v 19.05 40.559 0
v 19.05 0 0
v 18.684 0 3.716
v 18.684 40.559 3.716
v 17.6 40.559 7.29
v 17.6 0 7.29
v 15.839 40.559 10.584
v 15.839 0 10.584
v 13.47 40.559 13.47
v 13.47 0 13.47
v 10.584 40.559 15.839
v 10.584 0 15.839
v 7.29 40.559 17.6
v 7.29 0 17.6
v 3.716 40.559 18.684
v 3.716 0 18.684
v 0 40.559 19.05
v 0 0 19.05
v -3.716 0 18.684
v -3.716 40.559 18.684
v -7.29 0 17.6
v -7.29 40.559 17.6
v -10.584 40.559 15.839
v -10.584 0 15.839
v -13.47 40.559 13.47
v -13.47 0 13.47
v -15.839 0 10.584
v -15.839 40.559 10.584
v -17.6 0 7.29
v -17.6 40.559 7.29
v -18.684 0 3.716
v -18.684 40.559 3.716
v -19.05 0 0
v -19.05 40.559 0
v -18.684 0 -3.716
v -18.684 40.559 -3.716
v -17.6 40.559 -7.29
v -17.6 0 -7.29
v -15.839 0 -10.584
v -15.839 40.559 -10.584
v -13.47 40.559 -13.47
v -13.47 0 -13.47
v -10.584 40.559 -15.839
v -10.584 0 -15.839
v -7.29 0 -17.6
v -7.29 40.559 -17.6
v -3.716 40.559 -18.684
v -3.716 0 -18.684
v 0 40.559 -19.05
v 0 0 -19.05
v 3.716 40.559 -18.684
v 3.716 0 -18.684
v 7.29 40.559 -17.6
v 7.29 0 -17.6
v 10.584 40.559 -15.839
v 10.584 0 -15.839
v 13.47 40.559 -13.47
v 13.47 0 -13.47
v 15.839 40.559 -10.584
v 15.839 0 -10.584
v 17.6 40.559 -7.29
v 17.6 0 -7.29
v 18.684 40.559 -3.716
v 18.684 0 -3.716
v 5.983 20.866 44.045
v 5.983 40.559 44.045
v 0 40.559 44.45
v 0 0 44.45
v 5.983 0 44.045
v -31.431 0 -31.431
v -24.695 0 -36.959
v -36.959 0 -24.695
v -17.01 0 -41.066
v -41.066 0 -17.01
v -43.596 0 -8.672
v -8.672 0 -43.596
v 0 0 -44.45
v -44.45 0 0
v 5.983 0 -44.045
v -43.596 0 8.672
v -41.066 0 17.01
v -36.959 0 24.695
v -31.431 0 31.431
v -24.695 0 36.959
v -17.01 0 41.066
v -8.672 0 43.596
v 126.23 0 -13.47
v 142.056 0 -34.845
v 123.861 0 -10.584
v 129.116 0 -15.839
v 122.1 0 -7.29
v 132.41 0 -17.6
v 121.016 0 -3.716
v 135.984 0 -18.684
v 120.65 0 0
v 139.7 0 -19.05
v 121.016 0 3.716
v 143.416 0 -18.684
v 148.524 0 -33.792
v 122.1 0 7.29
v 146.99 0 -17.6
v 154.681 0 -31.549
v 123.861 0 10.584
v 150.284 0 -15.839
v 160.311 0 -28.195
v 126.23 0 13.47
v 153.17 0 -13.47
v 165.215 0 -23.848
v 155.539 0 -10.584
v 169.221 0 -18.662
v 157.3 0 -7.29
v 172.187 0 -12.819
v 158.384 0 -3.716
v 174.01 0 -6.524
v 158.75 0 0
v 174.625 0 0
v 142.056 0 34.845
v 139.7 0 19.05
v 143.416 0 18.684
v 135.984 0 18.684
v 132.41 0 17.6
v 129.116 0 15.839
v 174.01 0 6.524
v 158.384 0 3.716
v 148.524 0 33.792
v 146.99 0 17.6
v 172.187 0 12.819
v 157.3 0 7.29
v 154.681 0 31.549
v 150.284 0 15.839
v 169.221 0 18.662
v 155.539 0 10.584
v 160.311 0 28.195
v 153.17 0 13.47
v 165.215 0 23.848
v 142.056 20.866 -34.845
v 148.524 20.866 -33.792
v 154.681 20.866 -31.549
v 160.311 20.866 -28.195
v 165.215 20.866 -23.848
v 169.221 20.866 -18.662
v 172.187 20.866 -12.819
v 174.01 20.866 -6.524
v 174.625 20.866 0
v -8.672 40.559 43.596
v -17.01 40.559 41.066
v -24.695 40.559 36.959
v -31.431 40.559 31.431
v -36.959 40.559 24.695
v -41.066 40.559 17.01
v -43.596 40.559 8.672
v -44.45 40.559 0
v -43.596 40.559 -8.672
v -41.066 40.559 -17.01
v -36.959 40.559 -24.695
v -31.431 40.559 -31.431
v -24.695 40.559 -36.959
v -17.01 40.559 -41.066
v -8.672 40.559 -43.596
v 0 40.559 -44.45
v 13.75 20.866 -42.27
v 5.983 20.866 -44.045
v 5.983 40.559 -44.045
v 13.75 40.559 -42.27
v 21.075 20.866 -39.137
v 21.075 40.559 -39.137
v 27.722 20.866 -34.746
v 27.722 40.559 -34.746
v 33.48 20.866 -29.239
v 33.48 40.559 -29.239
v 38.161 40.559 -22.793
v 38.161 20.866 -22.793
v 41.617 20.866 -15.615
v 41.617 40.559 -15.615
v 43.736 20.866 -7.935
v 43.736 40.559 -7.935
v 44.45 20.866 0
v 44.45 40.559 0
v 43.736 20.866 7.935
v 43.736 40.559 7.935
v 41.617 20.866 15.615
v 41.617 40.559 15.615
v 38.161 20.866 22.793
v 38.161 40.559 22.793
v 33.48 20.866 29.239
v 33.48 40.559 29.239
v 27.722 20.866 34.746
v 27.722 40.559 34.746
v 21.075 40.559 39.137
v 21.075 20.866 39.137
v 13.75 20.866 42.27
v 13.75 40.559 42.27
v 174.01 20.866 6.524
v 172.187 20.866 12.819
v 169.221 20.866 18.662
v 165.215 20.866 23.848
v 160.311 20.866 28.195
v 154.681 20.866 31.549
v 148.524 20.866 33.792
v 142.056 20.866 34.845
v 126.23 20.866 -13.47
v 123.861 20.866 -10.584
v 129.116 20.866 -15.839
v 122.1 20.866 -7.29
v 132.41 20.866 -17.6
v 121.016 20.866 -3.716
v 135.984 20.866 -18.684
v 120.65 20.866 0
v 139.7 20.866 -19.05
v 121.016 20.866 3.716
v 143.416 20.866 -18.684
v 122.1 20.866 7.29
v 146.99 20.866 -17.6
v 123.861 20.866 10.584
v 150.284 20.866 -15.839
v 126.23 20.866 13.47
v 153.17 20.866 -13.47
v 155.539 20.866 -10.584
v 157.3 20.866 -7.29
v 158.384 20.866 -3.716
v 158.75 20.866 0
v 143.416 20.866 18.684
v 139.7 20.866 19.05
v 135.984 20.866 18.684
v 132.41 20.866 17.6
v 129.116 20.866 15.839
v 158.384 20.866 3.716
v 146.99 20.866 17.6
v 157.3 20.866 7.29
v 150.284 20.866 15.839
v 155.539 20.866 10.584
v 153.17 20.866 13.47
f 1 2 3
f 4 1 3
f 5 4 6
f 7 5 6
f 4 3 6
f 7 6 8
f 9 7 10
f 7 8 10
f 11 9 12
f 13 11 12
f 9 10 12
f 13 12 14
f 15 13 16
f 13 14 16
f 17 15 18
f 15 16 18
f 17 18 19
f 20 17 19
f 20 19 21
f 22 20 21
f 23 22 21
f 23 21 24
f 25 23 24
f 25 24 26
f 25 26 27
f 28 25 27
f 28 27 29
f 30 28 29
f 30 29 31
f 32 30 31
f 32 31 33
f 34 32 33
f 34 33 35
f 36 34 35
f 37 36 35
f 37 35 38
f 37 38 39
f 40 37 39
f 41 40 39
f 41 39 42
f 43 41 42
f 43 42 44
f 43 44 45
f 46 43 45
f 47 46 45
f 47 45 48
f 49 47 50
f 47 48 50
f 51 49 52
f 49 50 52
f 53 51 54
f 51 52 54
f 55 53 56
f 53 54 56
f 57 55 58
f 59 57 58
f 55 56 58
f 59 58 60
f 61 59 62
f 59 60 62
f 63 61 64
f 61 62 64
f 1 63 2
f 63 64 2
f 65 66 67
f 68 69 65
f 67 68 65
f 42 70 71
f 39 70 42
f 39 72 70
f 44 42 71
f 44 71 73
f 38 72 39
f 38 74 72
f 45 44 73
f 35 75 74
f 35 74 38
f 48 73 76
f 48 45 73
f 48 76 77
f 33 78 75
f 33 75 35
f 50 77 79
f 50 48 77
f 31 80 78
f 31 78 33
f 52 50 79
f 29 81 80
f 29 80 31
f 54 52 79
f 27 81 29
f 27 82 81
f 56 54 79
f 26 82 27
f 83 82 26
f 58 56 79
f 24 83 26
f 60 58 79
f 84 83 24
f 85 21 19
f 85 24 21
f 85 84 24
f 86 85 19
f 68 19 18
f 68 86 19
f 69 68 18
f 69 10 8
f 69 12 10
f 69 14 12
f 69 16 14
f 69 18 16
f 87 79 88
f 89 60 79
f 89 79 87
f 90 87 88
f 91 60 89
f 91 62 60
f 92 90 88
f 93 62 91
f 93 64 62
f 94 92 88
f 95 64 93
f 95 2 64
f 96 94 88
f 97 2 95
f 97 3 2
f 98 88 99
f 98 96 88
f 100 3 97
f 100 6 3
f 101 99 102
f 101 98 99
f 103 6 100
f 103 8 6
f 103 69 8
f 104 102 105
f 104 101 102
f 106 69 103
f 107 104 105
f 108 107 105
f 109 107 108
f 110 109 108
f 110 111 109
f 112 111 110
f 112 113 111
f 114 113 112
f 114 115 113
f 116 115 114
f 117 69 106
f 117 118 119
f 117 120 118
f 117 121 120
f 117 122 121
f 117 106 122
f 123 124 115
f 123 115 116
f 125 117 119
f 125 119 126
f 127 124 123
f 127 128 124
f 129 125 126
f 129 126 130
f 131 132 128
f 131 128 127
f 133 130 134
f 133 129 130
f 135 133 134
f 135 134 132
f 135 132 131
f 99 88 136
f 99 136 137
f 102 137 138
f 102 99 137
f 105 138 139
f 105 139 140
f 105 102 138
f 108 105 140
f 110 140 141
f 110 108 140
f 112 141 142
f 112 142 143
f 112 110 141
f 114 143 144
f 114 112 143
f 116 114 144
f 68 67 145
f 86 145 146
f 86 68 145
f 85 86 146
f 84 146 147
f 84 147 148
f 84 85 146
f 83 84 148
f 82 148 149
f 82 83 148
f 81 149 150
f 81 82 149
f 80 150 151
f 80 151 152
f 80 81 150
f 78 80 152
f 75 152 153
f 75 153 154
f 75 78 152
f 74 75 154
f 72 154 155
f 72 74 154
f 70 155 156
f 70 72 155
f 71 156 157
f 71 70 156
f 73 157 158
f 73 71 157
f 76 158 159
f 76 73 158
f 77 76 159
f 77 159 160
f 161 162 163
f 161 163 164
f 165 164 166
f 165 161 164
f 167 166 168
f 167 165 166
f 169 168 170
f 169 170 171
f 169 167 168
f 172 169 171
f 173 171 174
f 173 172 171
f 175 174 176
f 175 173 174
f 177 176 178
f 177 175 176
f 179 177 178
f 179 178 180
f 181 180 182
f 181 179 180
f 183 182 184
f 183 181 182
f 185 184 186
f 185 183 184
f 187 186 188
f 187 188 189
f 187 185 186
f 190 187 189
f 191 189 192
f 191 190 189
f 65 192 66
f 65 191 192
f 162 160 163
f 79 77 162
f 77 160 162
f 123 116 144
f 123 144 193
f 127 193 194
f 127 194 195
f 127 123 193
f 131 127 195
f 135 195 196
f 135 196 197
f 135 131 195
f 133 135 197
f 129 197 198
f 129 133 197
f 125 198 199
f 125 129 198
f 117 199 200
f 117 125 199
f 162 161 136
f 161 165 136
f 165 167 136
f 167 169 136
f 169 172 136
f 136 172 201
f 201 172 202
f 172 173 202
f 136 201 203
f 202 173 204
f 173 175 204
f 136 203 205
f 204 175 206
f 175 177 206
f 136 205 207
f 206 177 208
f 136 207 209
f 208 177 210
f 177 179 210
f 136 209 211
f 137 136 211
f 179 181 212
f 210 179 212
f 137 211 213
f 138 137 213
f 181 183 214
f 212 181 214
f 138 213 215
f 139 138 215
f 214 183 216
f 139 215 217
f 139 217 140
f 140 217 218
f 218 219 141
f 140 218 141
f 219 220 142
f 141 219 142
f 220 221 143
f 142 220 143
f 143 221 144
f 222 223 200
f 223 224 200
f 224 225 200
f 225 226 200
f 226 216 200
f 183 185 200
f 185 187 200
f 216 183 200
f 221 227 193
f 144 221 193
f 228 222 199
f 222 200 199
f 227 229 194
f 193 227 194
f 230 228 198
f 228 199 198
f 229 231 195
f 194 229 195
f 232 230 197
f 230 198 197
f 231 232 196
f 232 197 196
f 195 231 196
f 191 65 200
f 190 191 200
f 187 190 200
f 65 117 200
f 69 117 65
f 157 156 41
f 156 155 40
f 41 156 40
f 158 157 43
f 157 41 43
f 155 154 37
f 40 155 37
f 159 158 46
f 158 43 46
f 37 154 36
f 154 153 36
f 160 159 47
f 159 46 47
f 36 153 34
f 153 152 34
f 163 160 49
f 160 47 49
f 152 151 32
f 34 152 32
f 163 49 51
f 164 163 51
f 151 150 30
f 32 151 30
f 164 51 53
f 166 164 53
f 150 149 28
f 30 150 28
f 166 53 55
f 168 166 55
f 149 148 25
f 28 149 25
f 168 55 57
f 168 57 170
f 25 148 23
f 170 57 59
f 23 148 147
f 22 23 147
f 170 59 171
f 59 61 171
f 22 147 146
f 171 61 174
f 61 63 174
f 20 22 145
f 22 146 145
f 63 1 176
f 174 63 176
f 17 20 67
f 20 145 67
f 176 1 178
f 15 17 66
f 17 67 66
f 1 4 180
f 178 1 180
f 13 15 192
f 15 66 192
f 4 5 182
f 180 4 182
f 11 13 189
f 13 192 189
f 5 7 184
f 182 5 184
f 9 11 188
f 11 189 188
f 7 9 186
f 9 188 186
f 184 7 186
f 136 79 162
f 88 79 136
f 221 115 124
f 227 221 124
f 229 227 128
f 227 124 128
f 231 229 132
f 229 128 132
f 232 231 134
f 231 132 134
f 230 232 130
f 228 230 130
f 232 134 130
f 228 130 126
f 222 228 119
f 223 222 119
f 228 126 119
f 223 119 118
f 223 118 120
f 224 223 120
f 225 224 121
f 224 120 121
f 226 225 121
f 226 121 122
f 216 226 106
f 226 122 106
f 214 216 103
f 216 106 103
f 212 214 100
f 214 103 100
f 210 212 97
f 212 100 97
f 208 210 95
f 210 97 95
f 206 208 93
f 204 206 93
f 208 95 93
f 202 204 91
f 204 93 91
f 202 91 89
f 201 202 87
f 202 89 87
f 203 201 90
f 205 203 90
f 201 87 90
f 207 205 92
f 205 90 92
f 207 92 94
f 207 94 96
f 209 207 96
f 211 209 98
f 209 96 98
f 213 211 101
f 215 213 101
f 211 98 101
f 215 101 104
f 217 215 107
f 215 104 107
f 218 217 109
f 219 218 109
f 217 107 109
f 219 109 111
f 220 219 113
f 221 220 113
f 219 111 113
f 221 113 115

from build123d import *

# Parameters (mm, degrees)
F0_R     = 19.05
F1_DEPTH = 20.8662841469
F2_DEPTH = 40.5588373542


# Not quite as in the source:
# - the program builds the solid bodies; features that only make, move or delete a surface that nothing else refers to are left out


with BuildPart() as f1:
    # F0 (on Front) → F1 (new body)
    with BuildSketch(Plane.XZ):
        with BuildLine():
            Line((5.983272408, 44.0454645939), (0, 44.45))
            ThreePointArc((0, 44.45), (-44.45, 0), (0, -44.45))
            Line((0, -44.45), (5.983272408, -44.0454645939))
            ThreePointArc((5.983272408, -44.0454645939), (33.4795382177, -29.2390666871), (44.45, 0))
            ThreePointArc((44.45, 0), (33.4795382177, 29.2390666871), (5.983272408, 44.0454645939))
        make_face()
        Circle(F0_R, mode=Mode.SUBTRACT)
        with BuildLine():
            Line((142.0559377087, 34.8454470844), (5.983272408, 44.0454645939))
            ThreePointArc((5.983272408, 44.0454645939), (33.4795382177, 29.2390666871), (44.45, 0))
            ThreePointArc((44.45, 0), (33.4795382177, -29.2390666871), (5.983272408, -44.0454645939))
            Line((5.983272408, -44.0454645939), (142.0559377087, -34.8454470844))
            ThreePointArc((142.0559377087, -34.8454470844), (104.775, 0), (142.0559377087, 34.8454470844))
        make_face()
        with BuildLine():
            ThreePointArc((174.625, 0), (165.2150617232, 23.8482127268), (142.0559377087, 34.8454470844))
            ThreePointArc((142.0559377087, 34.8454470844), (104.775, 0), (142.0559377087, -34.8454470844))
            ThreePointArc((142.0559377087, -34.8454470844), (165.2150617232, -23.8482127268), (174.625, 0))
        make_face()
        with Locations((139.7, 0)):
            Circle(F0_R, mode=Mode.SUBTRACT)
    extrude(amount=-F1_DEPTH)

    # F0 (on Front) → F2 (join)
    with BuildSketch(Plane.XZ):
        with BuildLine():
            Line((5.983272408, 44.0454645939), (0, 44.45))
            ThreePointArc((0, 44.45), (-44.45, 0), (0, -44.45))
            Line((0, -44.45), (5.983272408, -44.0454645939))
            ThreePointArc((5.983272408, -44.0454645939), (33.4795382177, -29.2390666871), (44.45, 0))
            ThreePointArc((44.45, 0), (33.4795382177, 29.2390666871), (5.983272408, 44.0454645939))
        make_face()
        Circle(F0_R, mode=Mode.SUBTRACT)
    extrude(amount=-F2_DEPTH)


solid = f1.part
